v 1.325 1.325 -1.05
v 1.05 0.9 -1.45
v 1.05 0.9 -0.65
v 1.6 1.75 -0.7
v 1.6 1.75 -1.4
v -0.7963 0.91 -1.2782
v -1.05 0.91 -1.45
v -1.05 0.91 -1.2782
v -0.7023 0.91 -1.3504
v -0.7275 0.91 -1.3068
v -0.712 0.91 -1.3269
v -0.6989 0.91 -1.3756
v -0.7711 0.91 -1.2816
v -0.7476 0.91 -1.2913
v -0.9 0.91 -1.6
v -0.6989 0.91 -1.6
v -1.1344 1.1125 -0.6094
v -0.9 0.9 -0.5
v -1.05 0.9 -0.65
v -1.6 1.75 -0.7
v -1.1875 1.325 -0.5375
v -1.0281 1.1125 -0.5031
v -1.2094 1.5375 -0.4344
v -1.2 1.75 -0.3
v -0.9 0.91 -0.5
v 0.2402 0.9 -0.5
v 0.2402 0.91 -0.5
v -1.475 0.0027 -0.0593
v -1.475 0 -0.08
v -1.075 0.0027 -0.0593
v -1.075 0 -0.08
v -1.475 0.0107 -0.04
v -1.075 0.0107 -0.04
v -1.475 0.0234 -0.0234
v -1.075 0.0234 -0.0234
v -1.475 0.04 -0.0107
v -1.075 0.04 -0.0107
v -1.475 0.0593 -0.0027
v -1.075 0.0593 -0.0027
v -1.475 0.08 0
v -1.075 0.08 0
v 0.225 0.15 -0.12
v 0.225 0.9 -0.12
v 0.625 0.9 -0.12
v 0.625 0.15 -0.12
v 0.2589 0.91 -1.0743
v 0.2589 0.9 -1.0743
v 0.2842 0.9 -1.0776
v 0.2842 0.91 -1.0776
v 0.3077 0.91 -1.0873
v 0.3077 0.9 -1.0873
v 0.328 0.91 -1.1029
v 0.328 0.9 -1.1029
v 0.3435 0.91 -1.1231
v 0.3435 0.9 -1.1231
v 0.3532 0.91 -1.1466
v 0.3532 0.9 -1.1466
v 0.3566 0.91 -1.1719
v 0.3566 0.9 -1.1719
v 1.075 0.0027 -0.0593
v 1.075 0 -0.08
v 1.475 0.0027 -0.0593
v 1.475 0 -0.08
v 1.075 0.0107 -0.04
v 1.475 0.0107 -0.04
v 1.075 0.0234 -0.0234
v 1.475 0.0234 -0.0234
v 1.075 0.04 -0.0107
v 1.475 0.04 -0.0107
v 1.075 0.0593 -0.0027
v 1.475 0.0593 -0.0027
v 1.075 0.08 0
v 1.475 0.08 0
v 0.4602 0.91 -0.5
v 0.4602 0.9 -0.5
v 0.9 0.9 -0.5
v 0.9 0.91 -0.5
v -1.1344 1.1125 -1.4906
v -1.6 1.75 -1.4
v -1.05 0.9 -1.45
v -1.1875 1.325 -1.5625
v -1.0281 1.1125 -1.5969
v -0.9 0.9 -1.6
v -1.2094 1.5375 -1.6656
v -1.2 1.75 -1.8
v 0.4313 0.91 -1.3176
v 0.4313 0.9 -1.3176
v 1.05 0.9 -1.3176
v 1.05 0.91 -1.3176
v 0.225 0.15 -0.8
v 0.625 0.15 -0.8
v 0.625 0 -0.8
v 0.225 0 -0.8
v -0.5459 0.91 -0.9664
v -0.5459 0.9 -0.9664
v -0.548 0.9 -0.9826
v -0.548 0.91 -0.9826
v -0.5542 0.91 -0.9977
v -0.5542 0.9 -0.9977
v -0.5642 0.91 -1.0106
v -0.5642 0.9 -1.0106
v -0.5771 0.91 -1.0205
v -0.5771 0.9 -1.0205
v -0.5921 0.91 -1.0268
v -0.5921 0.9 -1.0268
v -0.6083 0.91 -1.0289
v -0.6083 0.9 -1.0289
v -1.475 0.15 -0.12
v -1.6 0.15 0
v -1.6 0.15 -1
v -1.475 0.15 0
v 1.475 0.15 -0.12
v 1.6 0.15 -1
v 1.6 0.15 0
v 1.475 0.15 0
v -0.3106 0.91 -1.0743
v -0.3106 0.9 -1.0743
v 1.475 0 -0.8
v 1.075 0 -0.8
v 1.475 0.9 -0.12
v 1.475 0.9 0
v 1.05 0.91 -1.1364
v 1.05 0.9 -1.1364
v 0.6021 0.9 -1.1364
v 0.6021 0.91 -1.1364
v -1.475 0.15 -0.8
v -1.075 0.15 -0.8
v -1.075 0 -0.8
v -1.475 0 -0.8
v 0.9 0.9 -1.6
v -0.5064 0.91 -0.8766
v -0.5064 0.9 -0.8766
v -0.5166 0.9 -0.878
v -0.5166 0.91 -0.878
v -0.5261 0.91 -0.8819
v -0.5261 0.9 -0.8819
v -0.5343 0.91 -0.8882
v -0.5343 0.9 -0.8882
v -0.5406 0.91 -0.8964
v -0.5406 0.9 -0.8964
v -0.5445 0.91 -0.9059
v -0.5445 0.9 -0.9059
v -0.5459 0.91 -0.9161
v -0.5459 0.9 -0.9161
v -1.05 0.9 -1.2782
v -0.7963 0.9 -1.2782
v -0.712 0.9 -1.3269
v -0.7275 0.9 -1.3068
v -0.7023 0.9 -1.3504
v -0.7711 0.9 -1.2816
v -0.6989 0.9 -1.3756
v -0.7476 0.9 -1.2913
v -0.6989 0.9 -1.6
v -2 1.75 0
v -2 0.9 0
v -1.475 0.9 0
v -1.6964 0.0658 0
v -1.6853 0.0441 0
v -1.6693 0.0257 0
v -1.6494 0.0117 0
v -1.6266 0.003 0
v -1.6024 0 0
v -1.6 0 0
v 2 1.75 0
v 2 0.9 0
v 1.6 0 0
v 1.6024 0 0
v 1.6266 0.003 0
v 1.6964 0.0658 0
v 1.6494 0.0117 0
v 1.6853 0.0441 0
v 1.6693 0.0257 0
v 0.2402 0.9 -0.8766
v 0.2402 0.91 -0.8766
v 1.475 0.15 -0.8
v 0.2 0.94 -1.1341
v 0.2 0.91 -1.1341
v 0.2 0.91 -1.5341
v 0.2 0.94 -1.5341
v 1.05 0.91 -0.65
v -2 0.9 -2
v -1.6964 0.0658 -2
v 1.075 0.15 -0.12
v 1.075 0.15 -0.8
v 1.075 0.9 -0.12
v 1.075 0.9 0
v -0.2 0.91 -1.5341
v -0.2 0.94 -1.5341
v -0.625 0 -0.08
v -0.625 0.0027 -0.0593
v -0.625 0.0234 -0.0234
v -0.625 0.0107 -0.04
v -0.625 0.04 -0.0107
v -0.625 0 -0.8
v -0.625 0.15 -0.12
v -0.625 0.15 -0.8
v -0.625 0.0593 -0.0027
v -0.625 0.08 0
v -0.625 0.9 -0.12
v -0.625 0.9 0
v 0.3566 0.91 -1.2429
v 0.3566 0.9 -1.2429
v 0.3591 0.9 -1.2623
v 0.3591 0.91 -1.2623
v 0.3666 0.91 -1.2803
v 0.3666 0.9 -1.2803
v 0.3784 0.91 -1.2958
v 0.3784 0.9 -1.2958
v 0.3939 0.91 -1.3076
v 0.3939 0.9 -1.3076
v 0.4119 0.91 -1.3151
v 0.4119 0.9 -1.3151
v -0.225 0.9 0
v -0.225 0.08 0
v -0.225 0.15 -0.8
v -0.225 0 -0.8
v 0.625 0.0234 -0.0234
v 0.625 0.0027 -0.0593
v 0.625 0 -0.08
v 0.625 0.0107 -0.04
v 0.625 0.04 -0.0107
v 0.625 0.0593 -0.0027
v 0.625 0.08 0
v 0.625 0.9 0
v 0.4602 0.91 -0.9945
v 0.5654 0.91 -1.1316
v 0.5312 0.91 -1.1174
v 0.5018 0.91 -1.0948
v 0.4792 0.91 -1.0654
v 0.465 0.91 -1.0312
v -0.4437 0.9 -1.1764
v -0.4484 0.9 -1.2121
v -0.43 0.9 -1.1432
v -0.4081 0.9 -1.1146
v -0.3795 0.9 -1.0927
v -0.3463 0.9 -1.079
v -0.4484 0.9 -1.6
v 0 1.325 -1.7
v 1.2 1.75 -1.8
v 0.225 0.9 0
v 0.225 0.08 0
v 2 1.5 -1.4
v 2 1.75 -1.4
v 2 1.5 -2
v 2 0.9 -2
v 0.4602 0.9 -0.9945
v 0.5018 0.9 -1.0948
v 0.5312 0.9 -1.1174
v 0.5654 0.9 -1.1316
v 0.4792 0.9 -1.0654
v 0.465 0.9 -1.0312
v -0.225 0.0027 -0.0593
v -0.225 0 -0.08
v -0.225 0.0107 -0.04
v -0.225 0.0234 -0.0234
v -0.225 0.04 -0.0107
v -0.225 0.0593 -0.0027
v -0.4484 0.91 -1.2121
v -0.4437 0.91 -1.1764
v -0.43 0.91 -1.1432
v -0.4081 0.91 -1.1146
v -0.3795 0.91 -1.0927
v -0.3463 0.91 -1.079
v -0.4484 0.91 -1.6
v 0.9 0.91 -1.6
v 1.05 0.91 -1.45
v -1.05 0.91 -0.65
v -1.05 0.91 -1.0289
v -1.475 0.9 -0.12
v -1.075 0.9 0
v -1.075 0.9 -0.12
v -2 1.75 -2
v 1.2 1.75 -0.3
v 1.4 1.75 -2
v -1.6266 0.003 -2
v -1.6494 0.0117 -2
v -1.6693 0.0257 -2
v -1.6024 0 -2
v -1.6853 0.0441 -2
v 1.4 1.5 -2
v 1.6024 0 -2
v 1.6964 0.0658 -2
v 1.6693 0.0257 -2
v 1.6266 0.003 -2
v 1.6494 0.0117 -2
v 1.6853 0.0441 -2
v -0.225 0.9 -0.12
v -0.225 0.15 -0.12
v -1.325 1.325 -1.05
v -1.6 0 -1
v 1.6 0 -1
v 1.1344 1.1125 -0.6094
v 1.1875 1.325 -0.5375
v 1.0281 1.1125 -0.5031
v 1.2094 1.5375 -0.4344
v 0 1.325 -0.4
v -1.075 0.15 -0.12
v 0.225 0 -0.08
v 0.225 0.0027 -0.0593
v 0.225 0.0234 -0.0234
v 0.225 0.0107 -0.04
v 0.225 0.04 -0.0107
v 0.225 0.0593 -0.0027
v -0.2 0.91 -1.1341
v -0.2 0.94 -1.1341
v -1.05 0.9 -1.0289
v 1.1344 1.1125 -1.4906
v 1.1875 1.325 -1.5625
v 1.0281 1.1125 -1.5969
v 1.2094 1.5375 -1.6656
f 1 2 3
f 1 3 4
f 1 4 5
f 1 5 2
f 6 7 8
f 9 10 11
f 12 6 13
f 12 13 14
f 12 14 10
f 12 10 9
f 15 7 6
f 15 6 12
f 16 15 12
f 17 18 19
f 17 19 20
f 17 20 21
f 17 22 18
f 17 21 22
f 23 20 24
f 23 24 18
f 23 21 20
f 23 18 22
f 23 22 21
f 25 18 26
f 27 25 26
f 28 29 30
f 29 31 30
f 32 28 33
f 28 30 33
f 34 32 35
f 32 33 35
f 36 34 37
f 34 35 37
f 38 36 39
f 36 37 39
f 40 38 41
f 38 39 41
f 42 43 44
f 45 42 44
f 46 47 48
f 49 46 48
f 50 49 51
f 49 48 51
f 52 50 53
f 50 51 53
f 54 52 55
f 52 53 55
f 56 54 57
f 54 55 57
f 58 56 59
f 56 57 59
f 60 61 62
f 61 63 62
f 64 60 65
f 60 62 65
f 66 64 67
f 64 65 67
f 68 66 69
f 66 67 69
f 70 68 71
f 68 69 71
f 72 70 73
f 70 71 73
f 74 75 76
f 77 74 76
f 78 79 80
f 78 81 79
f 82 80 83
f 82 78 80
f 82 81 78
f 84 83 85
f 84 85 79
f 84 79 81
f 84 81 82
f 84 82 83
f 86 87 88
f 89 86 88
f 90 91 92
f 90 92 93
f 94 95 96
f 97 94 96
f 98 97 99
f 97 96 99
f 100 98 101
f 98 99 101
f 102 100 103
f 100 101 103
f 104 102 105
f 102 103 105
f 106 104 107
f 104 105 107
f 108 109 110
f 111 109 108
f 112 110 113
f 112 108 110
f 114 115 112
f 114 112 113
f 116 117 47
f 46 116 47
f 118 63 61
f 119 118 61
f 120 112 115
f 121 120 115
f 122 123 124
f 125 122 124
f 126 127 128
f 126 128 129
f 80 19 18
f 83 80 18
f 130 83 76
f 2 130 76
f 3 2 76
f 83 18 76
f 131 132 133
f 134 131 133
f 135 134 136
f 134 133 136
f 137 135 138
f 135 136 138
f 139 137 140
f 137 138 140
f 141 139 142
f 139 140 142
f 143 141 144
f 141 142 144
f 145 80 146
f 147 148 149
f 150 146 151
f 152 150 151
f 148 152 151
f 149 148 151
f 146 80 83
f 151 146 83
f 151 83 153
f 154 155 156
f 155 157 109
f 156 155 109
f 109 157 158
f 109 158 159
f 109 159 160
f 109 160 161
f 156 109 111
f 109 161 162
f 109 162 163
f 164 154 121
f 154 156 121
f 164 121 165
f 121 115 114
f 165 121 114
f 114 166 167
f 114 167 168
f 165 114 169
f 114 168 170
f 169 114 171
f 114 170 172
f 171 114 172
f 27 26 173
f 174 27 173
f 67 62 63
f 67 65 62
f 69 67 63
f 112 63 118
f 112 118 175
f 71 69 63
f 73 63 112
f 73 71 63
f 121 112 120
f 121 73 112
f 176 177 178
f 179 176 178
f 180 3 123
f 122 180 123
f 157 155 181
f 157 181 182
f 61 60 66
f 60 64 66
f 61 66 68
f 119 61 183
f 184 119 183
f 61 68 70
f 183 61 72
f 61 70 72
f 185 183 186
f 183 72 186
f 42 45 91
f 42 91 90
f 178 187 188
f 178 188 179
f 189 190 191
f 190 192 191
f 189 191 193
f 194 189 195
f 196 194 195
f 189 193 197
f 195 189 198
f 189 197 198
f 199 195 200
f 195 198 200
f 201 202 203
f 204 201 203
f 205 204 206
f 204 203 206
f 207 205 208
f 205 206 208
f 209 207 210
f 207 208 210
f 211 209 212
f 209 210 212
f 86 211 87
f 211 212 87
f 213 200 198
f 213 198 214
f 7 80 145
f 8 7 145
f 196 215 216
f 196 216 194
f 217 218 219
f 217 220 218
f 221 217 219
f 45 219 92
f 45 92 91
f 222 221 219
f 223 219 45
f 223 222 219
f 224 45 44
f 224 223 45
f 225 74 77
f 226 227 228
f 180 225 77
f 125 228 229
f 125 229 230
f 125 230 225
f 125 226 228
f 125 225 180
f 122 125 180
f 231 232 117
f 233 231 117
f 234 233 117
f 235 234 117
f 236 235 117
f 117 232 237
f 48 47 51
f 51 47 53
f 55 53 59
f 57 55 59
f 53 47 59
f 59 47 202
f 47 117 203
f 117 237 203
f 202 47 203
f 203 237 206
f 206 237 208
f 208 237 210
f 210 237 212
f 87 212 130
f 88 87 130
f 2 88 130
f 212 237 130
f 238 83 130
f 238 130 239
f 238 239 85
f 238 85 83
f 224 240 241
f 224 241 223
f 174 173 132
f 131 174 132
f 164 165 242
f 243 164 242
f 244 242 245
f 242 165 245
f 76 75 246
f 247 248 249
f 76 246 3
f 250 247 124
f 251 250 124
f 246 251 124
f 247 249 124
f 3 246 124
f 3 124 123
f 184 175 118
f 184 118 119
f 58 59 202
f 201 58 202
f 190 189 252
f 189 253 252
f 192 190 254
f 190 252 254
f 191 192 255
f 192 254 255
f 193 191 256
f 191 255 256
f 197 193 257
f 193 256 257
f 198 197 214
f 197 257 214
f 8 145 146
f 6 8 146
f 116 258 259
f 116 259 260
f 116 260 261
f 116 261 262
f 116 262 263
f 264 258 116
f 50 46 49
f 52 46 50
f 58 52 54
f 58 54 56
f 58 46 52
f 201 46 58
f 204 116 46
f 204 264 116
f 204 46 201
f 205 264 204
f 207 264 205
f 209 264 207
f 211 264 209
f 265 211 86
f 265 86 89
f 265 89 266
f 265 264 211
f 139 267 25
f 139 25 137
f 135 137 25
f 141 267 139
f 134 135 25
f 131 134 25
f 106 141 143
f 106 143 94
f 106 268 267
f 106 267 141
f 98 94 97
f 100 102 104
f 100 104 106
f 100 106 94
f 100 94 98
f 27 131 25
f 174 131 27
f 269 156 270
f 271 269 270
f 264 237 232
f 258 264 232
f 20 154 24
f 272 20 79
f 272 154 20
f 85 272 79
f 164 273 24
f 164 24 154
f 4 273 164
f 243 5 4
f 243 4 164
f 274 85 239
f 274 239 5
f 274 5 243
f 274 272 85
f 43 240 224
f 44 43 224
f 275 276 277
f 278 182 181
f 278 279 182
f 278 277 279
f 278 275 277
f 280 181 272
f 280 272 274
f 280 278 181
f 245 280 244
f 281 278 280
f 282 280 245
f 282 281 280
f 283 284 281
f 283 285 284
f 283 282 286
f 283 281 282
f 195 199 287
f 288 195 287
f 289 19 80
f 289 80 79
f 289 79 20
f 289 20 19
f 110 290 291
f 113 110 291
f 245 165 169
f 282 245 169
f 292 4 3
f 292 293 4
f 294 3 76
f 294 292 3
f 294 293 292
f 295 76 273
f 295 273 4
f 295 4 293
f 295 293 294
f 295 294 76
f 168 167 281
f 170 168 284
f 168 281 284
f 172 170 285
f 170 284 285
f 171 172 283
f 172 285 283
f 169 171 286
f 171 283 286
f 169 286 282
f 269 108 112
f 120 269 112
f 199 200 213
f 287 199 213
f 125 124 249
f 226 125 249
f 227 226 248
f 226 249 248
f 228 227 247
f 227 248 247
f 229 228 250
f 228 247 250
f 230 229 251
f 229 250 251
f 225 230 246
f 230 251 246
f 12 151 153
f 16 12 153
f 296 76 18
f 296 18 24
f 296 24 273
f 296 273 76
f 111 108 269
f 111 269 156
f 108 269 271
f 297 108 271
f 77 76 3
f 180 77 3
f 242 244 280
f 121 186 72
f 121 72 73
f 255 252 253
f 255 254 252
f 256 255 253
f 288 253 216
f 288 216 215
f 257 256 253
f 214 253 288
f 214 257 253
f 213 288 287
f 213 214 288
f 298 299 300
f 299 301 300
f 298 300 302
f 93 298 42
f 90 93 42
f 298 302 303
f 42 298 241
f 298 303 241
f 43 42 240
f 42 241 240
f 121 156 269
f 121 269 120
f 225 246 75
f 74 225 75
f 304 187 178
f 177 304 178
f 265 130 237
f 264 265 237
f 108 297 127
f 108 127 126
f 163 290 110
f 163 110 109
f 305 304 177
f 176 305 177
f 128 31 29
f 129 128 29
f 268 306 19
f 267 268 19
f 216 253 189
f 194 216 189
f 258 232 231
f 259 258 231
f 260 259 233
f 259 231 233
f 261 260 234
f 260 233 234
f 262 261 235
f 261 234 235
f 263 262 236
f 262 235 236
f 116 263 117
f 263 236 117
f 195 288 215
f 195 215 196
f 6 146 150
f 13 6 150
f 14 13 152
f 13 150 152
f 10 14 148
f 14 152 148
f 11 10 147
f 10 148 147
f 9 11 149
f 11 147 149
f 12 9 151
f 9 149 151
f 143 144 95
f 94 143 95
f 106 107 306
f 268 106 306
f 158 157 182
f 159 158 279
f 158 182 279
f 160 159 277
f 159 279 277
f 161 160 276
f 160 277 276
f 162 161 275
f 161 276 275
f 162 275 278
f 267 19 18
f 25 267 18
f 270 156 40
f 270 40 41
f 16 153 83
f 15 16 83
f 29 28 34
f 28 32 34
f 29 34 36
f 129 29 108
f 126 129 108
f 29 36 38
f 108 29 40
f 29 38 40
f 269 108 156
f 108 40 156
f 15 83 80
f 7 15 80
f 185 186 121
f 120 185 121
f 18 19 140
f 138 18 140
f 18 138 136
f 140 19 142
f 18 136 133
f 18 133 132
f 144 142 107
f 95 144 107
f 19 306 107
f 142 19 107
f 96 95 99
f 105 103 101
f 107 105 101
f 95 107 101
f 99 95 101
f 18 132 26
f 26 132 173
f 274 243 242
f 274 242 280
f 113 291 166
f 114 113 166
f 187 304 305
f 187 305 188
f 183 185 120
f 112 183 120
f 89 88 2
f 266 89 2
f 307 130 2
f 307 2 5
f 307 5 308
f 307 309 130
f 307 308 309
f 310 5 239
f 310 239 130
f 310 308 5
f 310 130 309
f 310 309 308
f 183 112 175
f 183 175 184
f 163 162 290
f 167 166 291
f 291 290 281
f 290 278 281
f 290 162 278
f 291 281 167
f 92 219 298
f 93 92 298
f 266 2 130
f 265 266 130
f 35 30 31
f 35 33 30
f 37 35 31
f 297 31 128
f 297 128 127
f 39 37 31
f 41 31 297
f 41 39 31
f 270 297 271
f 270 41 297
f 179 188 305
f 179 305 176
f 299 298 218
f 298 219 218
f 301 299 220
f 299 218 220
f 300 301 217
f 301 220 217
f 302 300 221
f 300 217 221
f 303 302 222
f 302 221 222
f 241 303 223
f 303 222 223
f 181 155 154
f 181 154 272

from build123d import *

# Parameters (mm, degrees)
SKETCH_1_W          = 4
SKETCH_1_H          = 2
EXTRUDE_1_DEPTH     = 1.75
CUT_EXTRUDE_1_REACH = 4
CUT_EXTRUDE_2_DEPTH = 0.25
FILLET_1_R          = 0.1
SKETCH_8_W          = 3.2
SKETCH_8_H          = 1
CUT_EXTRUDE_3_DEPTH = 0.15
SKETCH_9_W          = 2.95
SKETCH_9_H          = 0.12
CUT_EXTRUDE_4_DEPTH = 0.75
SKETCH_10_W         = 0.4
SKETCH_10_H         = 0.12
EXTRUDE_2_DEPTH     = 0.9
EXTRUDE_2_2_DEPTH   = 0.9
EXTRUDE_2_3_DEPTH   = 0.9
EXTRUDE_2_4_DEPTH   = 0.9
SKETCH_11_W         = 0.4
SKETCH_11_H         = 0.15
EXTRUDE_3_DEPTH     = 0.68
SKETCH_13_W         = 0.4
SKETCH_13_H         = 0.15
EXTRUDE_4_DEPTH     = 0.68
SKETCH_16_W         = 0.4
SKETCH_16_H         = 0.15
EXTRUDE_5_DEPTH     = 0.68
SKETCH_17_W         = 0.4
SKETCH_17_H         = 0.15
EXTRUDE_6_DEPTH     = 0.68
FILLET_2_R          = 0.08
FILLET_3_R          = 0.08
FILLET_4_R          = 0.08
FILLET_5_R          = 0.08
EXTRUDE_7_DEPTH     = 0.01
EXTRUDE_7_2_DEPTH   = 0.01
EXTRUDE_7_3_DEPTH   = 0.01
EXTRUDE_7_4_DEPTH   = 0.01
SKETCH_19_W         = 0.4
SKETCH_19_H         = 0.4
EXTRUDE_8_DEPTH     = 0.03


with BuildPart() as part:
    # Sketch 1 → Extrude 1 (new body)
    with BuildSketch(Plane(origin=(0, 0, 0), x_dir=(1, 0, 0), z_dir=(0, 1, 0))):
        with Locations((0, 1)):
            Rectangle(SKETCH_1_W, SKETCH_1_H)
    extrude(amount=EXTRUDE_1_DEPTH)

    # Sketch 2 → Cut-Extrude 1 (cut, up to next)
    with BuildSketch(Plane.XY, mode=Mode.PRIVATE) as cut_extrude_1_sk1:
        Polygon((-2, 0.9), (-1.672426789, 0), (-2, 0), align=None)
    cut_extrude_1_tool1 = extrude(cut_extrude_1_sk1.sketch, amount=-CUT_EXTRUDE_1_REACH, mode=Mode.PRIVATE) & part.part
    add(cut_extrude_1_tool1.solids().sort_by_distance((-1.890809, 0.3, 0))[0], mode=Mode.SUBTRACT)
    # Sketch 2 → Cut-Extrude 1 (cut, up to next)
    with BuildSketch(Plane.XY, mode=Mode.PRIVATE) as cut_extrude_1_sk2:
        Polygon((2, 0.9), (1.672426789, 0), (2, 0), align=None)
    cut_extrude_1_tool2 = extrude(cut_extrude_1_sk2.sketch, amount=-CUT_EXTRUDE_1_REACH, mode=Mode.PRIVATE) & part.part
    add(cut_extrude_1_tool2.solids().sort_by_distance((1.890809, 0.3, 0))[0], mode=Mode.SUBTRACT)

    # Sketch 6 → Loft 1 section 0
    with BuildSketch(Plane(origin=(0, 0.9, 0), x_dir=(1, 0, 0), z_dir=(0, 1, 0))):
        Polygon((-0.9, 1.6), (0.9, 1.6), (1.05, 1.45), (1.05, 0.65), (0.9, 0.5), (-0.9, 0.5), (-1.05, 0.65), (-1.05, 1.45), align=None)
    # Sketch 4 → Loft 1 section 1
    with BuildSketch(Plane(origin=(0, 1.75, 0), x_dir=(1, 0, 0), z_dir=(0, 1, 0))):
        Polygon((-1.6, 1.4), (-1.2, 1.8), (1.2, 1.8), (1.6, 1.4), (1.6, 0.7), (1.2, 0.3), (-1.2, 0.3), (-1.6, 0.7), align=None)
    loft(mode=Mode.SUBTRACT)

    # Sketch 7 → Cut-Extrude 2 (cut)
    with BuildSketch(Plane(origin=(0, 1.75, 0), x_dir=(1, 0, 0), z_dir=(0, 1, 0))):
        Polygon((2, 1.4), (1.4, 2), (2, 2), align=None)
    extrude(amount=-CUT_EXTRUDE_2_DEPTH, mode=Mode.SUBTRACT)

    # Fillet 1
    fillet_1_edges = [part.edges().sort_by_distance(p)[0] for p in [
        (-1.672426789, 0, -1),
        (1.672426789, 0, -1),
    ]]
    fillet(fillet_1_edges, radius=FILLET_1_R)

    # Sketch 8 → Cut-Extrude 3 (cut)
    with BuildSketch(Plane.XZ):
        with Locations((0, -0.5)):
            Rectangle(SKETCH_8_W, SKETCH_8_H)
    extrude(amount=-CUT_EXTRUDE_3_DEPTH, mode=Mode.SUBTRACT)

    # Sketch 9 → Cut-Extrude 4 (cut)
    with BuildSketch(Plane.XZ.offset(-0.15)):
        with Locations((0, -0.06)):
            Rectangle(SKETCH_9_W, SKETCH_9_H)
    extrude(amount=-CUT_EXTRUDE_4_DEPTH, mode=Mode.SUBTRACT)


with BuildPart() as body_2:
    # Sketch 10 → Extrude 2 (new body)
    with BuildSketch(Plane.XZ.offset(-0.9)):
        with Locations((-1.275, -0.06)):
            Rectangle(SKETCH_10_W, SKETCH_10_H)
    extrude(amount=EXTRUDE_2_DEPTH)


with BuildPart() as body_3:
    # Sketch 10 → Extrude 2 2 (new body)
    with BuildSketch(Plane.XZ.offset(-0.9)):
        with Locations((-0.425, -0.06)):
            Rectangle(SKETCH_10_W, SKETCH_10_H)
    extrude(amount=EXTRUDE_2_2_DEPTH)


with BuildPart() as body_4:
    # Sketch 10 → Extrude 2 3 (new body)
    with BuildSketch(Plane.XZ.offset(-0.9)):
        with Locations((0.425, -0.06)):
            Rectangle(SKETCH_10_W, SKETCH_10_H)
    extrude(amount=EXTRUDE_2_3_DEPTH)


with BuildPart() as body_5:
    # Sketch 10 → Extrude 2 4 (new body)
    with BuildSketch(Plane.XZ.offset(-0.9)):
        with Locations((1.275, -0.06)):
            Rectangle(SKETCH_10_W, SKETCH_10_H)
    extrude(amount=EXTRUDE_2_4_DEPTH)


with BuildPart() as body_6:
    # Sketch 11 → Extrude 3 (new body)
    with BuildSketch(Plane(origin=(0, 0, -0.12), x_dir=(-1, 0, 0), z_dir=(0, 0, -1))):
        with Locations((-1.275, 0.075)):
            Rectangle(SKETCH_11_W, SKETCH_11_H)
    extrude(amount=EXTRUDE_3_DEPTH)


with BuildPart() as body_7:
    # Sketch 13 → Extrude 4 (new body)
    with BuildSketch(Plane(origin=(0, 0, -0.12), x_dir=(-1, 0, 0), z_dir=(0, 0, -1))):
        with Locations((-0.425, 0.075)):
            Rectangle(SKETCH_13_W, SKETCH_13_H)
    extrude(amount=EXTRUDE_4_DEPTH)


with BuildPart() as body_8:
    # Sketch 16 → Extrude 5 (new body)
    with BuildSketch(Plane(origin=(0, 0, -0.12), x_dir=(-1, 0, 0), z_dir=(0, 0, -1))):
        with Locations((0.425, 0.075)):
            Rectangle(SKETCH_16_W, SKETCH_16_H)
    extrude(amount=EXTRUDE_5_DEPTH)


with BuildPart() as body_9:
    # Sketch 17 → Extrude 6 (new body)
    with BuildSketch(Plane(origin=(0, 0, -0.12), x_dir=(-1, 0, 0), z_dir=(0, 0, -1))):
        with Locations((1.275, 0.075)):
            Rectangle(SKETCH_17_W, SKETCH_17_H)
    extrude(amount=EXTRUDE_6_DEPTH)


with BuildPart() as body_5_1:
    add(body_5.part)

    # Combine 2: union body 6
    add(body_6.part)

    # Fillet 2
    fillet_2_edges = [body_5_1.edges().sort_by_distance(p)[0] for p in [
        (1.275, 0, 0),
    ]]
    fillet(fillet_2_edges, radius=FILLET_2_R)


with BuildPart() as body_2_1:
    add(body_2.part)

    # Combine 3: union body 9
    add(body_9.part)

    # Fillet 5
    fillet_5_edges = [body_2_1.edges().sort_by_distance(p)[0] for p in [
        (-1.275, 0, 0),
    ]]
    fillet(fillet_5_edges, radius=FILLET_5_R)


with BuildPart() as body_4_1:
    add(body_4.part)

    # Combine 6: union body 7
    add(body_7.part)

    # Fillet 3
    fillet_3_edges = [body_4_1.edges().sort_by_distance(p)[0] for p in [
        (0.425, 0, 0),
    ]]
    fillet(fillet_3_edges, radius=FILLET_3_R)


with BuildPart() as body_3_1:
    add(body_3.part)

    # Combine 7: union body 8
    add(body_8.part)

    # Fillet 4
    fillet_4_edges = [body_3_1.edges().sort_by_distance(p)[0] for p in [
        (-0.425, 0, 0),
    ]]
    fillet(fillet_4_edges, radius=FILLET_4_R)


with BuildPart() as body_6_2:
    # Sketch 18 → Extrude 7 (new body)
    with BuildSketch(Plane(origin=(0, 0.9, 0), x_dir=(1, 0, 0), z_dir=(0, 1, 0))):
        with BuildLine():
            Line((1.05, 1.45), (0.9, 1.6))
            Line((0.9, 1.6), (-0.448423463, 1.6))
            Line((-0.448423463, 1.6), (-0.448423463, 1.212059073))
            ThreePointArc((-0.448423463, 1.212059073), (-0.408063152, 1.114620663), (-0.310624741, 1.074260352))
            Line((-0.310624741, 1.074260352), (0.258908283, 1.074260352))
            ThreePointArc((0.258908283, 1.074260352), (0.32796203, 1.10286335), (0.356565028, 1.171917097))
            Line((0.356565028, 1.171917097), (0.356565028, 1.242938885))
            ThreePointArc((0.356565028, 1.242938885), (0.378443208, 1.295757483), (0.431261807, 1.317635663))
            Line((0.431261807, 1.317635663), (1.05, 1.317635663))
            Line((1.05, 1.317635663), (1.05, 1.45))
        make_face()
    extrude(amount=EXTRUDE_7_DEPTH)


with BuildPart() as body_7_2:
    # Sketch 18 → Extrude 7 2 (new body)
    with BuildSketch(Plane(origin=(0, 0.9, 0), x_dir=(1, 0, 0), z_dir=(0, 1, 0))):
        with BuildLine():
            Line((1.05, 0.65), (1.05, 1.136407249))
            Line((1.05, 1.136407249), (0.602120574, 1.136407249))
            ThreePointArc((0.602120574, 1.136407249), (0.501770239, 1.094840779), (0.46020377, 0.994490444))
            Line((0.46020377, 0.994490444), (0.46020377, 0.5))
            Line((0.46020377, 0.5), (0.9, 0.5))
            Line((0.9, 0.5), (1.05, 0.65))
        make_face()
    extrude(amount=EXTRUDE_7_2_DEPTH)


with BuildPart() as body_8_2:
    # Sketch 18 → Extrude 7 3 (new body)
    with BuildSketch(Plane(origin=(0, 0.9, 0), x_dir=(1, 0, 0), z_dir=(0, 1, 0))):
        with BuildLine():
            Line((-0.9, 0.5), (0.240206256, 0.5))
            Line((0.240206256, 0.5), (0.240206256, 0.876622221))
            Line((0.240206256, 0.876622221), (-0.506383258, 0.876622221))
            ThreePointArc((-0.506383258, 0.876622221), (-0.534302481, 0.888186742), (-0.545867002, 0.916105964))
            Line((-0.545867002, 0.916105964), (-0.545867002, 0.966443449))
            ThreePointArc((-0.545867002, 0.966443449), (-0.564154154, 1.010592542), (-0.608303247, 1.028879695))
            Line((-0.608303247, 1.028879695), (-1.05, 1.028879695))
            Line((-1.05, 1.028879695), (-1.05, 0.65))
            Line((-1.05, 0.65), (-0.9, 0.5))
        make_face()
    extrude(amount=EXTRUDE_7_3_DEPTH)


with BuildPart() as body_9_2:
    # Sketch 18 → Extrude 7 4 (new body)
    with BuildSketch(Plane(origin=(0, 0.9, 0), x_dir=(1, 0, 0), z_dir=(0, 1, 0))):
        with BuildLine():
            Line((-1.05, 1.45), (-1.05, 1.278241059))
            Line((-1.05, 1.278241059), (-0.79630602, 1.278241059))
            ThreePointArc((-0.79630602, 1.278241059), (-0.727464657, 1.306756085), (-0.69894963, 1.375597448))
            Line((-0.69894963, 1.375597448), (-0.69894963, 1.6))
            Line((-0.69894963, 1.6), (-0.9, 1.6))
            Line((-0.9, 1.6), (-1.05, 1.45))
        make_face()
    extrude(amount=EXTRUDE_7_4_DEPTH)


with BuildPart() as body_10:
    # Sketch 19 → Extrude 8 (new body)
    with BuildSketch(Plane(origin=(0, 0.91, 0), x_dir=(1, 0, 0), z_dir=(0, 1, 0))):
        with Locations((0, 1.334128878)):
            Rectangle(SKETCH_19_W, SKETCH_19_H)
    extrude(amount=EXTRUDE_8_DEPTH)


solid = Compound([part.part, body_5_1.part, body_2_1.part, body_4_1.part, body_3_1.part, body_6_2.part, body_7_2.part, body_8_2.part, body_9_2.part, body_10.part])
